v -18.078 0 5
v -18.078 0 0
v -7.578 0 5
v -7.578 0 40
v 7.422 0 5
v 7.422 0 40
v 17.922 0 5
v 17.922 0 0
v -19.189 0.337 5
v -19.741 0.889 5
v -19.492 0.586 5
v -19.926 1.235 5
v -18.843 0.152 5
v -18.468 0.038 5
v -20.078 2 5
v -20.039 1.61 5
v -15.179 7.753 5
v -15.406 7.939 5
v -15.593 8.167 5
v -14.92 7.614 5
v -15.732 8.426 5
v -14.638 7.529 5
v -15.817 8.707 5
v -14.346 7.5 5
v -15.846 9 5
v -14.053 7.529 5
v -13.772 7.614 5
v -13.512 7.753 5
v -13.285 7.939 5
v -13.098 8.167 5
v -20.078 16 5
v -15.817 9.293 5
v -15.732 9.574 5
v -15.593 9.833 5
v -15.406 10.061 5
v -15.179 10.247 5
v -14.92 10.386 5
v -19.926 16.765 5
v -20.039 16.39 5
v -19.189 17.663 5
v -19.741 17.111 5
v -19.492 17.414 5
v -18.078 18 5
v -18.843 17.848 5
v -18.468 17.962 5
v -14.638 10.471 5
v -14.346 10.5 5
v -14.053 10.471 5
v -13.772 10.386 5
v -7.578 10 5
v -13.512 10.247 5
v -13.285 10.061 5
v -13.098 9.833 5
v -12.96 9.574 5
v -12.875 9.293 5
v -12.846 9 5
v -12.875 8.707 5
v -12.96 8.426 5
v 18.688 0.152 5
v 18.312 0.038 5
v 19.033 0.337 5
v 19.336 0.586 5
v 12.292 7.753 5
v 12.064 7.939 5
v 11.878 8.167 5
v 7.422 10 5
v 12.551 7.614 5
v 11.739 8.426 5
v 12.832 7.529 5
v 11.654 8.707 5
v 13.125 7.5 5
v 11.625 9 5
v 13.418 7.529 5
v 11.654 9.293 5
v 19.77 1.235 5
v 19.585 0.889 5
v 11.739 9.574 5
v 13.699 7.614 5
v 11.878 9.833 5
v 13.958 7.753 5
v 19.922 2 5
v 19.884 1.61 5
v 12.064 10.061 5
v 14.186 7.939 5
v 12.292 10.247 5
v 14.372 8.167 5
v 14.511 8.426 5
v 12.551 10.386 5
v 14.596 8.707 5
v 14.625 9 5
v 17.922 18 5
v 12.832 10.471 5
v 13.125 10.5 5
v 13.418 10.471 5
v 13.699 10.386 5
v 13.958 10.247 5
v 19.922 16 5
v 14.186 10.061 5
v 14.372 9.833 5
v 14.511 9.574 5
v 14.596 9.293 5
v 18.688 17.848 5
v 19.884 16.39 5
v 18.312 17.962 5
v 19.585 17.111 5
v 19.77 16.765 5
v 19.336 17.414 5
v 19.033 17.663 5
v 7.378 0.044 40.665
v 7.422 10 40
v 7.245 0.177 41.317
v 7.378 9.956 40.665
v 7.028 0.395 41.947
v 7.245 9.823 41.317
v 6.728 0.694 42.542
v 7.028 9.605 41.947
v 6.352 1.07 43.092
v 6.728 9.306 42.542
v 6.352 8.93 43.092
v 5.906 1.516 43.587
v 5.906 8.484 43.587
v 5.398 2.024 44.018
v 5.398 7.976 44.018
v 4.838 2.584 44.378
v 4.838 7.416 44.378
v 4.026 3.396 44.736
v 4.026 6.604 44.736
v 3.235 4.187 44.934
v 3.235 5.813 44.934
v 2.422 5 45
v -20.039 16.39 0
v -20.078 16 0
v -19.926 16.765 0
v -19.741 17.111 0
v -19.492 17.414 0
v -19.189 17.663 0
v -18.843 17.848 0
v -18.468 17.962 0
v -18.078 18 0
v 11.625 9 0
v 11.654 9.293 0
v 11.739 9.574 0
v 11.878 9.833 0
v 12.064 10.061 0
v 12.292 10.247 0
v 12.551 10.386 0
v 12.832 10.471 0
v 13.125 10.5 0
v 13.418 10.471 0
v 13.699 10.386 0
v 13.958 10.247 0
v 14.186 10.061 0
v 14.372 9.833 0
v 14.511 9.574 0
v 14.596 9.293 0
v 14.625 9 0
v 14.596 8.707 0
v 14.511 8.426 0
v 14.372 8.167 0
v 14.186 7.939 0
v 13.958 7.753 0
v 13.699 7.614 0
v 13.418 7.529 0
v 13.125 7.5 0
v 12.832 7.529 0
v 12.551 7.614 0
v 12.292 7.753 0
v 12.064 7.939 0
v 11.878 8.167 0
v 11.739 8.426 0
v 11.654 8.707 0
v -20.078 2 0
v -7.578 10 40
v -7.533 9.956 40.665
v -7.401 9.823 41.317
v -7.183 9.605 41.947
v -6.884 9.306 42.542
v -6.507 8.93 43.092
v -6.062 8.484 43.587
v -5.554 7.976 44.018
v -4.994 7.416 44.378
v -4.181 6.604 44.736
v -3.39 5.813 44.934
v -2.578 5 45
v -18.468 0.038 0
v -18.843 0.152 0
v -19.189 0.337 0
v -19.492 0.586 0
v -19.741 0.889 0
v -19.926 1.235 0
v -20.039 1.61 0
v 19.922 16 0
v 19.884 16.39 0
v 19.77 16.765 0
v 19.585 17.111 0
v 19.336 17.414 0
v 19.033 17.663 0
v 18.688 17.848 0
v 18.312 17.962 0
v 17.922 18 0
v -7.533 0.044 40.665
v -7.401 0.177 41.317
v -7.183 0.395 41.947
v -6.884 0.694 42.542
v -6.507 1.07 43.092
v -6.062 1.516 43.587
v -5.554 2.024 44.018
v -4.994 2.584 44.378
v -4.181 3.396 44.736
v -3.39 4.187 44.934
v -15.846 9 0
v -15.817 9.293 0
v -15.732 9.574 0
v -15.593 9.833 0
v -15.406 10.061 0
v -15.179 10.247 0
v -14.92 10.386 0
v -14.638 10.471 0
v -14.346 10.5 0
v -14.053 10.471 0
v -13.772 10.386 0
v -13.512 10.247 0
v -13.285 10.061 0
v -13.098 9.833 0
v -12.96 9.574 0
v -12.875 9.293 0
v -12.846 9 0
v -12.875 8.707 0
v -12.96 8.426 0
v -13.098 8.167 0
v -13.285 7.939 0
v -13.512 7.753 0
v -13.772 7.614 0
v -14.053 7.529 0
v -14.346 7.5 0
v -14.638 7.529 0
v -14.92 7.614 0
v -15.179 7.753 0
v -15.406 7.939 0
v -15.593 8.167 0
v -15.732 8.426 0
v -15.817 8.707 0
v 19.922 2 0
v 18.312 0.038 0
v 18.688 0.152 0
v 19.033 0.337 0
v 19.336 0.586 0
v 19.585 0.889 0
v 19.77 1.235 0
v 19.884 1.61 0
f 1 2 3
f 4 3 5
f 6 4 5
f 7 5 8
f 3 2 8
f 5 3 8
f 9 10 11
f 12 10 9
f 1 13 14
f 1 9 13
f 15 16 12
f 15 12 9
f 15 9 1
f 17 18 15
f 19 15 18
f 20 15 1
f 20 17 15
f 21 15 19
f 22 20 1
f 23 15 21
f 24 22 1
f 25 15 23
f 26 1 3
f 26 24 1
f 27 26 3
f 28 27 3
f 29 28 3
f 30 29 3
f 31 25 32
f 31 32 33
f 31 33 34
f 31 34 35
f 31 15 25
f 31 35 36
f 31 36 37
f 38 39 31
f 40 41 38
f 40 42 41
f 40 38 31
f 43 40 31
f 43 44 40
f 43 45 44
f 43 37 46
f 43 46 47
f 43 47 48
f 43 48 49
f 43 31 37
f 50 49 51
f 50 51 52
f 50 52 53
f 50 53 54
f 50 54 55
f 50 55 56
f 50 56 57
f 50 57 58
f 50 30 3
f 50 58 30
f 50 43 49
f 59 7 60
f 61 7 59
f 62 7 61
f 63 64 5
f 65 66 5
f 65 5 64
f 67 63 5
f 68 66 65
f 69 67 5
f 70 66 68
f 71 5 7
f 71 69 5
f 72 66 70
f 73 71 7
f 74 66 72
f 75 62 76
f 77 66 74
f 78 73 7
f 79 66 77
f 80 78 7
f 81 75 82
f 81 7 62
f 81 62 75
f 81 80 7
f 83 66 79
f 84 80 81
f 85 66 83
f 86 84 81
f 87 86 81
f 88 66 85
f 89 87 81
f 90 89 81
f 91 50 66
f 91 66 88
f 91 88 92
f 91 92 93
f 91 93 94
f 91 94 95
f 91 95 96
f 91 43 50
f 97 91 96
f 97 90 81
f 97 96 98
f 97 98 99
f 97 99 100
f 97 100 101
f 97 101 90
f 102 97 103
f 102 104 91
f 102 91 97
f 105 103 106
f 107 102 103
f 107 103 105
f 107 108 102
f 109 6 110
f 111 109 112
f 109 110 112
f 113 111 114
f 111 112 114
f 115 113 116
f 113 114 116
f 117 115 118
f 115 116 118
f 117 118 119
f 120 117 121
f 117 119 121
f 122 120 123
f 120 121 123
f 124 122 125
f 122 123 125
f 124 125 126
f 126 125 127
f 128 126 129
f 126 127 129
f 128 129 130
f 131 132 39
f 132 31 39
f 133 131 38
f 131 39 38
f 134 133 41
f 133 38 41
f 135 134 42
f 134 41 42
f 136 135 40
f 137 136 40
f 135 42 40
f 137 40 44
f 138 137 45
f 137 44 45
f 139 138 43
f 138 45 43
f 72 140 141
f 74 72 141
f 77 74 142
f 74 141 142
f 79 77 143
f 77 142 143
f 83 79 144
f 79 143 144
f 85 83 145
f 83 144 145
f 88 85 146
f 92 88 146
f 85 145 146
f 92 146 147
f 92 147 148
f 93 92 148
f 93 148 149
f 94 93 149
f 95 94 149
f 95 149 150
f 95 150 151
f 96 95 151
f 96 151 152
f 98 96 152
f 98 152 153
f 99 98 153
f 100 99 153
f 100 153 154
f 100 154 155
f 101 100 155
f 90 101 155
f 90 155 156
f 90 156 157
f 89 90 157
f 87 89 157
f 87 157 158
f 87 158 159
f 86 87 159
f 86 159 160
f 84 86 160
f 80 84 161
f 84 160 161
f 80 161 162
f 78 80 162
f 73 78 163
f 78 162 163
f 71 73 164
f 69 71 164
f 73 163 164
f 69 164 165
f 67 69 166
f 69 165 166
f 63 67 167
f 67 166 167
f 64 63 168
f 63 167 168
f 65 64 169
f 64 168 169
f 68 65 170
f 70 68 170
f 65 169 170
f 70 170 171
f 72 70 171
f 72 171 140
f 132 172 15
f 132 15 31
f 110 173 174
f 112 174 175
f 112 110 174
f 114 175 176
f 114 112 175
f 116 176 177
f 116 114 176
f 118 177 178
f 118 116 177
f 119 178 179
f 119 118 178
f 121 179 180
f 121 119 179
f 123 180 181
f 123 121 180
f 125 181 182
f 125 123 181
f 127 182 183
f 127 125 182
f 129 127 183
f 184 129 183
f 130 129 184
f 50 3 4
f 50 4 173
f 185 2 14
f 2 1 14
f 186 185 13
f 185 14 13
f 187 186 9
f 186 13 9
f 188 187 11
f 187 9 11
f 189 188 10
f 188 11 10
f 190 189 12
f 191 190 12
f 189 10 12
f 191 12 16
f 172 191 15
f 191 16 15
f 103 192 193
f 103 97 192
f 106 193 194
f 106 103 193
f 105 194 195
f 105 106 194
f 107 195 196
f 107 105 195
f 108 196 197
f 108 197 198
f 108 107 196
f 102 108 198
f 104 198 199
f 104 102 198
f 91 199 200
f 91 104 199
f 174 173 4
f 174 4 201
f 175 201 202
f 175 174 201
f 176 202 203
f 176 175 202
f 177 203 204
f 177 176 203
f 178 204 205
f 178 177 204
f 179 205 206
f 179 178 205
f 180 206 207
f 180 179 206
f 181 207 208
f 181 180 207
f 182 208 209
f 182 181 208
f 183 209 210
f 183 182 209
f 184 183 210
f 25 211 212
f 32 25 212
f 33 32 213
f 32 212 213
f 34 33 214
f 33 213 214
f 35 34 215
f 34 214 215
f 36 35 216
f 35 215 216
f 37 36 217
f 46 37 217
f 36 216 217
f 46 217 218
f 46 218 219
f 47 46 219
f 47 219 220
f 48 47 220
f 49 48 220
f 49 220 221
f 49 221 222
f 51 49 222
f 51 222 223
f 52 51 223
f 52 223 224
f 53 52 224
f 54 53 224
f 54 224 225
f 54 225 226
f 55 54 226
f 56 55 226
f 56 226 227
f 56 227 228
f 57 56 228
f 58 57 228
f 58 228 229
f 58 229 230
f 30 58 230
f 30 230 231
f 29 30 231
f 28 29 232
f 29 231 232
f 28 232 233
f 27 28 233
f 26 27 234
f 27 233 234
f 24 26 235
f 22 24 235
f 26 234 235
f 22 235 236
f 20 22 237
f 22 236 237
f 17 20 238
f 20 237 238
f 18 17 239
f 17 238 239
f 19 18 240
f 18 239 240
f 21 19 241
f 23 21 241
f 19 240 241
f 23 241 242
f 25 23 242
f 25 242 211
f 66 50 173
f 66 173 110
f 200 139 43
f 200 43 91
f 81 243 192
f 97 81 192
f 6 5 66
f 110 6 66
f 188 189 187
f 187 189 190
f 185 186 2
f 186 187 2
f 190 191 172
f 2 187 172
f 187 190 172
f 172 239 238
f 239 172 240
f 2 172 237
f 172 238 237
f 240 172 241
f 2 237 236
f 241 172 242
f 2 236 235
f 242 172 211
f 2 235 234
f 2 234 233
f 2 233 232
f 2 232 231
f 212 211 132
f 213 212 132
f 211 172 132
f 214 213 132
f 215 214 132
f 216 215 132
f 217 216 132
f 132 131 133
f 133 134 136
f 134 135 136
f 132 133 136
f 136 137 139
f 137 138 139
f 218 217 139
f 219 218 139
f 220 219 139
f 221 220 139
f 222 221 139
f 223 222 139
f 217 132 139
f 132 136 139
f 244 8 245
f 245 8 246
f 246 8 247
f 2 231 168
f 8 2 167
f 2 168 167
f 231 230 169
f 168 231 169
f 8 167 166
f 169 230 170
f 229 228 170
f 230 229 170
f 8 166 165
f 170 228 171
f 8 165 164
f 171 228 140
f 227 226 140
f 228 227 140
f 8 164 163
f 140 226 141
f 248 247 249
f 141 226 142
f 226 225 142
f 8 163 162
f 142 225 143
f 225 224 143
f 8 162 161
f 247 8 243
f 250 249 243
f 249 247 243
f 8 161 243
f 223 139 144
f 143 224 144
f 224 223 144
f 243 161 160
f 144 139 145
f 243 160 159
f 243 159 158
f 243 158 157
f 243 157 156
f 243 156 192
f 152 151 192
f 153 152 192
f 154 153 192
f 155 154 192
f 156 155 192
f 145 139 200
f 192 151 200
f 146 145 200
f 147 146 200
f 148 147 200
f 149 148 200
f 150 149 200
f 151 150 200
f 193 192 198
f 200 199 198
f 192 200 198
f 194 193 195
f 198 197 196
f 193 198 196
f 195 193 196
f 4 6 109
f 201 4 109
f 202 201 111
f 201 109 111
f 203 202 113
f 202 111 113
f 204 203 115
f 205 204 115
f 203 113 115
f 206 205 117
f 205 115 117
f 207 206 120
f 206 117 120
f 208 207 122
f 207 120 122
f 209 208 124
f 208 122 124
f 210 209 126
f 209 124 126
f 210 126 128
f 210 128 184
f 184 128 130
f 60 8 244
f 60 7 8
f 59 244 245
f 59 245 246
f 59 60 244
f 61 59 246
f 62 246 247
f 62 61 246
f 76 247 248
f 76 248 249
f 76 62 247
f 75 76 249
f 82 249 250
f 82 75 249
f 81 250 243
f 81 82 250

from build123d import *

# Parameters (mm, degrees)
F0_W     = 40
F0_H     = 18
F1_DEPTH = 5
F2_W     = 15
F2_H     = 10
F3_DEPTH = 40
F4_R     = 4.99999
F5_D     = 3
F5_DEPTH = 50
F5_TIP   = 0.9012909285
F6_R     = 2


# Not quite as in the source:
# - a fillet or chamfer is up to 0.001 mm smaller than in the source, because OpenCascade refuses the exact size


with BuildPart() as f1:
    # F0 (on Top) → F1 (new body)
    with BuildSketch(Plane.XY):
        with Locations((-0.0778210488, 9)):
            Rectangle(F0_W, F0_H)
    extrude(amount=F1_DEPTH)

    # F2 (on face) → F3 (join)
    with BuildSketch(Plane.XY.offset(5)):
        with Locations((-0.0778210488, 5)):
            Rectangle(F2_W, F2_H)
    extrude(amount=F3_DEPTH)

    # F4 (radius 5 in the source; OpenCascade refuses exactly that, so slightly less here)
    f4_edges = [f1.edges().sort_by_distance(p)[0] for p in [
        (7.422179, 5, 45),
        (-0.077821, 10, 45),
        (-7.577821, 5, 45),
        (-0.077821, 0, 45),
    ]]
    fillet(f4_edges, radius=F4_R)

    # F5
    with Locations(Plane.XY.offset(5)):
        with Locations((-14.3456859514, 9), (13.1249977276, 9)):
            Hole(F5_D / 2, depth=F5_DEPTH)
            with Locations((0, 0, -(F5_DEPTH + F5_TIP / 2))):  # 118° drill point
                Cone(0, F5_D / 2, F5_TIP, mode=Mode.SUBTRACT)

    # F6
    f6_edges = [f1.edges().sort_by_distance(p)[0] for p in [
        (-20.077821, 0, 2.5),
        (-20.077821, 18, 2.5),
        (19.922179, 18, 2.5),
        (19.922179, 0, 2.5),
    ]]
    fillet(f6_edges, radius=F6_R)


solid = f1.part
